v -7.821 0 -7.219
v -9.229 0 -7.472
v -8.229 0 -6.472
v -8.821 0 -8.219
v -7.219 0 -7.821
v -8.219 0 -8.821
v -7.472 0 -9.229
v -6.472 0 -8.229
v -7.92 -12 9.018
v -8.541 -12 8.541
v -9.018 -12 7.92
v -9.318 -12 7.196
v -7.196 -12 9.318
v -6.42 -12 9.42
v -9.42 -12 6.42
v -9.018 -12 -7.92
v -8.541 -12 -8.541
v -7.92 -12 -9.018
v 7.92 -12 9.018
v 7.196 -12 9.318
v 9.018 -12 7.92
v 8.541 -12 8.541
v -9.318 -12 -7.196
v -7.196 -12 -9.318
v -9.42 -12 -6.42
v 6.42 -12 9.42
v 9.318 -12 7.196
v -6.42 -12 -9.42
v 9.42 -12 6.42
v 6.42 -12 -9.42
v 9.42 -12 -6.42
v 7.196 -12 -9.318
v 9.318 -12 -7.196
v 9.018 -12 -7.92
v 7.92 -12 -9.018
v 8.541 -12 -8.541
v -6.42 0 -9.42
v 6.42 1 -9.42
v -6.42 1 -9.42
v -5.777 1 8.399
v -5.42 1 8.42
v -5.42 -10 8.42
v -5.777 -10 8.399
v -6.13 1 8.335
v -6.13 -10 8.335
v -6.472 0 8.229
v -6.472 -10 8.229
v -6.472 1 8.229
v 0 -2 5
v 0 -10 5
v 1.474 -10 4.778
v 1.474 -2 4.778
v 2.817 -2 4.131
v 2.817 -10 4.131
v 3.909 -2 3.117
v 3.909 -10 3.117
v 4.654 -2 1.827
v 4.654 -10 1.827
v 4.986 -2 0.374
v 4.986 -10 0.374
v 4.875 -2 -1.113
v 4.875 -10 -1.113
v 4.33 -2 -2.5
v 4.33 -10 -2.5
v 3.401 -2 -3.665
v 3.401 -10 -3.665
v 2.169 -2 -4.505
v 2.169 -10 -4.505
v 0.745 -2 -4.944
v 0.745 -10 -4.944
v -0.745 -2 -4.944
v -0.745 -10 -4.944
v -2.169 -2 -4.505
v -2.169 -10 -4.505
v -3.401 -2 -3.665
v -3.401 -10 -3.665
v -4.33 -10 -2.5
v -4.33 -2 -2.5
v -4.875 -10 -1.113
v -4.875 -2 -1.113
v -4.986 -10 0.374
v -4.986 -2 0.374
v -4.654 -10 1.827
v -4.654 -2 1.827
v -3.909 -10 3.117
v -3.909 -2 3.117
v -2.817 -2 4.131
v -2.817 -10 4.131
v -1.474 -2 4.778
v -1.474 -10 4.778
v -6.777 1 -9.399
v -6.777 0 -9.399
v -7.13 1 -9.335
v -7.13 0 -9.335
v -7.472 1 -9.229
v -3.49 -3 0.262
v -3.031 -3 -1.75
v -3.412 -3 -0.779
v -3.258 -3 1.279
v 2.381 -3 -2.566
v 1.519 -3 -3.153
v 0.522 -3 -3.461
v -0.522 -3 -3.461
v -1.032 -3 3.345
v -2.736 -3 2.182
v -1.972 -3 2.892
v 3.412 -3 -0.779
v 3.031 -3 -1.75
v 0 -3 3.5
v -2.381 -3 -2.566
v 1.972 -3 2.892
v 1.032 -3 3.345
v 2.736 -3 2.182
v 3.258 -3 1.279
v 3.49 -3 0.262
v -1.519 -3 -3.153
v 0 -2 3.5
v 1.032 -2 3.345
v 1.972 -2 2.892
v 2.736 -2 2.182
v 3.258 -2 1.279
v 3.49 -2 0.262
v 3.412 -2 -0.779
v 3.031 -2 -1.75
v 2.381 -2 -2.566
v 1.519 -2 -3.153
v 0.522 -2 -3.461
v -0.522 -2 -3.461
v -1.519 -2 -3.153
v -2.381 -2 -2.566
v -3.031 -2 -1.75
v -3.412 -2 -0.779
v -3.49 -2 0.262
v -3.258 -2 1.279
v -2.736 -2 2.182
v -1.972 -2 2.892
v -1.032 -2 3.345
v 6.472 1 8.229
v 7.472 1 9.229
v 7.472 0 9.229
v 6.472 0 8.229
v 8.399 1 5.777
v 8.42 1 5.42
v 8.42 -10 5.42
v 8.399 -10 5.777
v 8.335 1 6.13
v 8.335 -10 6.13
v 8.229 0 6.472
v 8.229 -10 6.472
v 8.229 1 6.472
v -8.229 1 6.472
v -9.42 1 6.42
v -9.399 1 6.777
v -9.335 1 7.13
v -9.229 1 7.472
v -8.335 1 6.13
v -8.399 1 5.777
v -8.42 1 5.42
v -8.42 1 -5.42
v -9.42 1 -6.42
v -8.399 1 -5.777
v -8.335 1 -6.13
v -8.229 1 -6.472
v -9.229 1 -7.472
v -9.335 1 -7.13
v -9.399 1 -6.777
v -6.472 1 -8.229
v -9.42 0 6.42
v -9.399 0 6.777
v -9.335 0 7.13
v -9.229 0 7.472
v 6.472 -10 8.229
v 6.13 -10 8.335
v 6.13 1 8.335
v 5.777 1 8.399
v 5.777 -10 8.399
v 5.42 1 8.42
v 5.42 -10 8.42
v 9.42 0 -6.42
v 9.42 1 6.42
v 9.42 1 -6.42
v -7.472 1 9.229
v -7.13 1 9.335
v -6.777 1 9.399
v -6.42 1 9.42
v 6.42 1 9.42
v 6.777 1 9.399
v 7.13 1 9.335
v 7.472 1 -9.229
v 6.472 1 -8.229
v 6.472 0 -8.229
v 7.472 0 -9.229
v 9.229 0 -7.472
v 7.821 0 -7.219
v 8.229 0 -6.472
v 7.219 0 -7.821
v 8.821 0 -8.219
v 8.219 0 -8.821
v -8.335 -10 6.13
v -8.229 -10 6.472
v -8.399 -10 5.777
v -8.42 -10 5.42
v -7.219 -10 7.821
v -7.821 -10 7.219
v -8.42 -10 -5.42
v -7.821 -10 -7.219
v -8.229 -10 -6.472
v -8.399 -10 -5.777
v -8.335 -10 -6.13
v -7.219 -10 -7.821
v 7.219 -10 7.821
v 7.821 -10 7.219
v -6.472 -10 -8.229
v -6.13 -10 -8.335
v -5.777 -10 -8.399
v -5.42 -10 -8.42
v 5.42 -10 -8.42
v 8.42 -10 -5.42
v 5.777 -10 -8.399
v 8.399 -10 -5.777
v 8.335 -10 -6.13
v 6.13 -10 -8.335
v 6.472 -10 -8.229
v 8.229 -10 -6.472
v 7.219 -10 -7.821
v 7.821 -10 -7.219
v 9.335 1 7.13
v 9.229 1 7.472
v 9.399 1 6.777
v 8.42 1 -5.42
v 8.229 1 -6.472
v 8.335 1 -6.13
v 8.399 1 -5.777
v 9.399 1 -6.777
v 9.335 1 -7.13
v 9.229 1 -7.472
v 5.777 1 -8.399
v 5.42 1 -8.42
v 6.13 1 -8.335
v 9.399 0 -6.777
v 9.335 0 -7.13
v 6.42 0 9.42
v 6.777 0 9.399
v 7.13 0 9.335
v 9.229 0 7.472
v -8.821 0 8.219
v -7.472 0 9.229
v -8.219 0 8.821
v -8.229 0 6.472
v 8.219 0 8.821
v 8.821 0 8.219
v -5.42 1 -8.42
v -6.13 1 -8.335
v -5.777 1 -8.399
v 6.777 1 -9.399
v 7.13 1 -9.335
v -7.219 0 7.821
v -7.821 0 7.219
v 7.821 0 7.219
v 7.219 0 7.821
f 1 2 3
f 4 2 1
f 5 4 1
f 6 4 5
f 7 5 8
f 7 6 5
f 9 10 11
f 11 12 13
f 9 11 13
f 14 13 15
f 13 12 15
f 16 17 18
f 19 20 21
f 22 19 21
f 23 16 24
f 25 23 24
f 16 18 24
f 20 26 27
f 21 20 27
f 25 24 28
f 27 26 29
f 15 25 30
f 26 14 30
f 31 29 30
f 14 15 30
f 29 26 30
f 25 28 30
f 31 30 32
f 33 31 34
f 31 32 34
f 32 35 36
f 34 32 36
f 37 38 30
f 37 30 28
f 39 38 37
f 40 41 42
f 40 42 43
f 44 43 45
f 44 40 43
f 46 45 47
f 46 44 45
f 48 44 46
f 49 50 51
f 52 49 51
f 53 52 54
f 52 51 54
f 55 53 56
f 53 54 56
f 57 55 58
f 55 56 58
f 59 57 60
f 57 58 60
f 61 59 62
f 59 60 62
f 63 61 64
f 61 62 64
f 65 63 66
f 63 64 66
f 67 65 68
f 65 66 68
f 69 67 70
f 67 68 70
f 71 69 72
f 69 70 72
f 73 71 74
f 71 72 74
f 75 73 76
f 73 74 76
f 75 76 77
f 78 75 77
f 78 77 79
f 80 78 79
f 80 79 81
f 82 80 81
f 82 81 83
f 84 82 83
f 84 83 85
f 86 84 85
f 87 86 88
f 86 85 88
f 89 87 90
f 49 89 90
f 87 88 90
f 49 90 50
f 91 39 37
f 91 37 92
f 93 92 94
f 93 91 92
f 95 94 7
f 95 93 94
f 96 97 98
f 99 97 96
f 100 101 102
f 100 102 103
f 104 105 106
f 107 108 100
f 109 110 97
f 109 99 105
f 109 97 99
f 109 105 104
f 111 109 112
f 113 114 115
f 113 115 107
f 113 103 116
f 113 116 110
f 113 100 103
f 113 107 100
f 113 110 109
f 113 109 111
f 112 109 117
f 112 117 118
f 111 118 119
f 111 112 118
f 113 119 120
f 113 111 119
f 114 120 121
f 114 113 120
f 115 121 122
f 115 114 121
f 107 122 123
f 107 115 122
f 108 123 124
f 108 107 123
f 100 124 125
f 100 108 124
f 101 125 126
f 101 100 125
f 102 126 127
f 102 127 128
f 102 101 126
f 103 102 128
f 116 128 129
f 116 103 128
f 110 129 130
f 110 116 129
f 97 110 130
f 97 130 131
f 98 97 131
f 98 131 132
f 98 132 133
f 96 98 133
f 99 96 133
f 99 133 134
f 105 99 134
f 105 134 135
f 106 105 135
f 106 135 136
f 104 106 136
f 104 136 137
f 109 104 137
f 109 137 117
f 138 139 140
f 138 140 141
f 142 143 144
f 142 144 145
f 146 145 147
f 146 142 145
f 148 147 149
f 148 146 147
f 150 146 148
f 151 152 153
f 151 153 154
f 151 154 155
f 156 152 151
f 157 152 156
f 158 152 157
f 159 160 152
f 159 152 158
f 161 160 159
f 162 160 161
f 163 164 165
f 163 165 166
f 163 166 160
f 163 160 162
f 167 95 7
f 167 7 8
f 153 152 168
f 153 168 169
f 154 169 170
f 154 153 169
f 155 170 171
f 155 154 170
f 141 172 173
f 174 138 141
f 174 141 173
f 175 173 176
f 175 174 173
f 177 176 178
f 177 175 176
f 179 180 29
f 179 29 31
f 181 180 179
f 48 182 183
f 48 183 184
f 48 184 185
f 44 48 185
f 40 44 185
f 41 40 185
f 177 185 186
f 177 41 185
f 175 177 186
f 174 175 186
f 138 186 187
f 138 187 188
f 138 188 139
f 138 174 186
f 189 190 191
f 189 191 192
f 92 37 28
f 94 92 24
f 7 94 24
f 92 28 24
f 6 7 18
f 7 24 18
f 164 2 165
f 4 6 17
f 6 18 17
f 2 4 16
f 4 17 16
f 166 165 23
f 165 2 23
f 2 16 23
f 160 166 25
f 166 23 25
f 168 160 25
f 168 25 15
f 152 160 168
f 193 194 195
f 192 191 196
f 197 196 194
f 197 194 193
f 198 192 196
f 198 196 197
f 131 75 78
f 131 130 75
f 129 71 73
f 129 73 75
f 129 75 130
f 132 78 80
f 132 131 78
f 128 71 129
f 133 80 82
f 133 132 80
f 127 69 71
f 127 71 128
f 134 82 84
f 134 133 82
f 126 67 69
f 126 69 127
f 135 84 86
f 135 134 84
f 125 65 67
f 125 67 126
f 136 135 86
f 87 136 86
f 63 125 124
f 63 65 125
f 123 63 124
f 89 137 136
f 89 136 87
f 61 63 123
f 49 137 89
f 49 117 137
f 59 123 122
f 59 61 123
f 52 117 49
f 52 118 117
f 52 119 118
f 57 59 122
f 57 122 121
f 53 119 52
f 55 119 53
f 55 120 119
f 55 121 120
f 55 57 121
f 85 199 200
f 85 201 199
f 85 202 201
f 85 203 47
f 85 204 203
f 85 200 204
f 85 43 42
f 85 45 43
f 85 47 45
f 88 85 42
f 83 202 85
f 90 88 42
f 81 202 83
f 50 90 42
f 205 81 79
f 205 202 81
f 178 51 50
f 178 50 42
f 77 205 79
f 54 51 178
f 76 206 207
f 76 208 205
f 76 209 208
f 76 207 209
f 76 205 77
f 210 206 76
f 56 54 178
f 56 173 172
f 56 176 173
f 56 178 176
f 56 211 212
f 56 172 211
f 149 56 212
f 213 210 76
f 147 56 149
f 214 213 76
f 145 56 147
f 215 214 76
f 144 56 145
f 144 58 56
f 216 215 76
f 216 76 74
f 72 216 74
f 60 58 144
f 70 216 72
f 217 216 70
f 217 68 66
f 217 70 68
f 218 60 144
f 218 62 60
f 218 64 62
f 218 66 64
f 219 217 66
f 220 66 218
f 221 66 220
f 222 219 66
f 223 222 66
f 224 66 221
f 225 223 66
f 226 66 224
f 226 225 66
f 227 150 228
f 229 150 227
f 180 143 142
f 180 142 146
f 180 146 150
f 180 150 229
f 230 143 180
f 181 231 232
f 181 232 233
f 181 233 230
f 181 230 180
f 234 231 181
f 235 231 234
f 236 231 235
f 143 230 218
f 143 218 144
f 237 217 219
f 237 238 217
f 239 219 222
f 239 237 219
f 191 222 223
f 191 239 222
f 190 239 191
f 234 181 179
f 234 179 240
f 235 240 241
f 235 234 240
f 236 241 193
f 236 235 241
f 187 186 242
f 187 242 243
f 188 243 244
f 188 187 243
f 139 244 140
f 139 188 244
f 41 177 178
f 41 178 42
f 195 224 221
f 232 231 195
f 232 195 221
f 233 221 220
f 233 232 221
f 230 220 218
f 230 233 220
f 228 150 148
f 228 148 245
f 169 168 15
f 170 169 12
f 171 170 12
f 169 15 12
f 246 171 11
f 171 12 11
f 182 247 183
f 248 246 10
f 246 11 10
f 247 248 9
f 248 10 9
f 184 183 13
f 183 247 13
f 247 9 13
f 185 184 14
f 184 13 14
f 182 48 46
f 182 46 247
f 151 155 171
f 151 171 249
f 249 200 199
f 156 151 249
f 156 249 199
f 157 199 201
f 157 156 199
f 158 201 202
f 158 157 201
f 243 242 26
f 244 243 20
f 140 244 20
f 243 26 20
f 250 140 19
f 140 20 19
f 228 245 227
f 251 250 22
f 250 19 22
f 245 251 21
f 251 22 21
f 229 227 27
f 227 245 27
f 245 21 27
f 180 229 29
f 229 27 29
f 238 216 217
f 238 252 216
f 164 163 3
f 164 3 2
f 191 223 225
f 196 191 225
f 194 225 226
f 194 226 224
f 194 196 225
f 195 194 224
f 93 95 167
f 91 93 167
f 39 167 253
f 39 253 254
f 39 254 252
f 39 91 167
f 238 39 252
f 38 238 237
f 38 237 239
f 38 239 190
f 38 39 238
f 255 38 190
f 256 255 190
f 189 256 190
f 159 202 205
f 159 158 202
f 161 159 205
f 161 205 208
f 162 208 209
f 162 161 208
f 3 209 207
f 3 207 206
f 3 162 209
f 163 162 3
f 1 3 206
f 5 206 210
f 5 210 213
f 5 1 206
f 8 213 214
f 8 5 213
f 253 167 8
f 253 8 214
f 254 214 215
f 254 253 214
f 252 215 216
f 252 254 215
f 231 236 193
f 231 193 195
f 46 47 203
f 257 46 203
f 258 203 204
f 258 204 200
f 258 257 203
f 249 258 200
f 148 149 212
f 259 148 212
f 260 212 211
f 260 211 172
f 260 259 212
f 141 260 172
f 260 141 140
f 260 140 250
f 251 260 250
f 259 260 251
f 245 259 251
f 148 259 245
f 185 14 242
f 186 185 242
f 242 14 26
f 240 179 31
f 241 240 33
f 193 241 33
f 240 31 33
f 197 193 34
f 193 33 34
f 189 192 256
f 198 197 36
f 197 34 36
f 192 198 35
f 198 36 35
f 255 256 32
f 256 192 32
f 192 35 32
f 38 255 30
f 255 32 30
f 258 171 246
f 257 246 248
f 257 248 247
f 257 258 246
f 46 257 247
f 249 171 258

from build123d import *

# Parameters (mm, degrees)
EXTRUDE_3_DEPTH = 10
EXTRUDE_START   = -12
EXTRUDE_4_DEPTH = 2
EXTRUDE_START_2 = 1
EXTRUDE_5_DEPTH = 1
SKETCH_2_R      = 5
SKETCH_2_R_2    = 3.5
EXTRUDE_6_DEPTH = 8
SKETCH_2_2_R    = 3.5
EXTRUDE_7_DEPTH = 7


# Read off the part's stored shape, not the designer's step: 凸台-拉伸4
with BuildPart() as part:
    # 草图1 → 凸台-拉伸3 (new body)
    with BuildSketch(Plane(origin=(0, 0, 0), x_dir=(1, 0, 0), z_dir=(0, 1, 0))):
        with BuildLine():
            Line((-8.229462415, 6.472103102), (-9.229462415, 7.472103102))
            ThreePointArc((-9.229462415, 7.472103102), (-9.371981305, 6.954608621), (-9.42, 6.42))
            Line((-9.42, 6.42), (-9.42, -6.42))
            ThreePointArc((-9.42, -6.42), (-9.371981305, -6.954608621), (-9.229462415, -7.472103102))
            Line((-9.229462415, -7.472103102), (-8.229462415, -6.472103102))
            ThreePointArc((-8.229462415, -6.472103102), (-8.371981305, -5.954608621), (-8.42, -5.42))
            Line((-8.42, -5.42), (-8.42, 5.42))
            ThreePointArc((-8.42, 5.42), (-8.371981305, 5.954608621), (-8.229462415, 6.472103102))
        make_face()
        with BuildLine():
            Line((-6.472103102, 8.229462415), (-7.472103102, 9.229462415))
            ThreePointArc((-7.472103102, 9.229462415), (-8.541320344, 8.541320344), (-9.229462415, 7.472103102))
            Line((-9.229462415, 7.472103102), (-8.229462415, 6.472103102))
            ThreePointArc((-8.229462415, 6.472103102), (-7.541320344, 7.541320344), (-6.472103102, 8.229462415))
        make_face()
        with BuildLine():
            ThreePointArc((7.472103102, 9.229462415), (6.954608621, 9.371981305), (6.42, 9.42))
            Line((6.42, 9.42), (-6.42, 9.42))
            ThreePointArc((-6.42, 9.42), (-6.954608621, 9.371981305), (-7.472103102, 9.229462415))
            Line((-7.472103102, 9.229462415), (-6.472103102, 8.229462415))
            ThreePointArc((-6.472103102, 8.229462415), (-5.954608621, 8.371981305), (-5.42, 8.42))
            Line((-5.42, 8.42), (5.42, 8.42))
            ThreePointArc((5.42, 8.42), (5.954608621, 8.371981305), (6.472103102, 8.229462415))
            Line((6.472103102, 8.229462415), (7.472103102, 9.229462415))
        make_face()
        with BuildLine():
            Line((-8.229462415, -6.472103102), (-9.229462415, -7.472103102))
            ThreePointArc((-9.229462415, -7.472103102), (-8.541320344, -8.541320344), (-7.472103102, -9.229462415))
            Line((-7.472103102, -9.229462415), (-6.472103102, -8.229462415))
            ThreePointArc((-6.472103102, -8.229462415), (-7.541320344, -7.541320344), (-8.229462415, -6.472103102))
        make_face()
        with BuildLine():
            ThreePointArc((6.42, -9.42), (6.954608621, -9.371981305), (7.472103102, -9.229462415))
            Line((7.472103102, -9.229462415), (6.472103102, -8.229462415))
            ThreePointArc((6.472103102, -8.229462415), (5.954608621, -8.371981305), (5.42, -8.42))
            Line((5.42, -8.42), (-5.42, -8.42))
            ThreePointArc((-5.42, -8.42), (-5.954608621, -8.371981305), (-6.472103102, -8.229462415))
            Line((-6.472103102, -8.229462415), (-7.472103102, -9.229462415))
            ThreePointArc((-7.472103102, -9.229462415), (-6.954608621, -9.371981305), (-6.42, -9.42))
            Line((-6.42, -9.42), (6.42, -9.42))
        make_face()
        with BuildLine():
            ThreePointArc((7.472103102, -9.229462415), (8.541320344, -8.541320344), (9.229462415, -7.472103102))
            Line((9.229462415, -7.472103102), (8.229462415, -6.472103102))
            ThreePointArc((8.229462415, -6.472103102), (7.541320344, -7.541320344), (6.472103102, -8.229462415))
            Line((6.472103102, -8.229462415), (7.472103102, -9.229462415))
        make_face()
        with BuildLine():
            ThreePointArc((9.42, 6.42), (9.371981305, 6.954608621), (9.229462415, 7.472103102))
            Line((9.229462415, 7.472103102), (8.229462415, 6.472103102))
            ThreePointArc((8.229462415, 6.472103102), (8.371981305, 5.954608621), (8.42, 5.42))
            Line((8.42, 5.42), (8.42, -5.42))
            ThreePointArc((8.42, -5.42), (8.371981305, -5.954608621), (8.229462415, -6.472103102))
            Line((8.229462415, -6.472103102), (9.229462415, -7.472103102))
            ThreePointArc((9.229462415, -7.472103102), (9.371981305, -6.954608621), (9.42, -6.42))
            Line((9.42, -6.42), (9.42, 6.42))
        make_face()
        with BuildLine():
            ThreePointArc((9.229462415, 7.472103102), (8.541320344, 8.541320344), (7.472103102, 9.229462415))
            Line((7.472103102, 9.229462415), (6.472103102, 8.229462415))
            ThreePointArc((6.472103102, 8.229462415), (7.541320344, 7.541320344), (8.229462415, 6.472103102))
            Line((8.229462415, 6.472103102), (9.229462415, 7.472103102))
        make_face()
    extrude(amount=-EXTRUDE_3_DEPTH)

    # 凸台-拉伸4 outline → 凸台-拉伸4 (add)
    with BuildSketch(Plane(origin=(0, 0, 0), x_dir=(1, 0, 0), z_dir=(0, 1, 0)).offset(EXTRUDE_START)):
        with BuildLine():
            Line((-9.42, 6.42), (-9.42, -6.42))
            ThreePointArc((-9.42, -6.42), (-8.541320344, -8.541320344), (-6.42, -9.42))
            Line((-6.42, -9.42), (6.42, -9.42))
            ThreePointArc((6.42, -9.42), (8.541320344, -8.541320344), (9.42, -6.42))
            Line((9.42, -6.42), (9.42, 6.42))
            ThreePointArc((9.42, 6.42), (8.541320344, 8.541320344), (6.42, 9.42))
            Line((6.42, 9.42), (-6.42, 9.42))
            ThreePointArc((-6.42, 9.42), (-8.541320344, 8.541320344), (-9.42, 6.42))
        make_face()
    extrude(amount=EXTRUDE_4_DEPTH)

    # 草图1<7> → 凸台-拉伸5 (add)
    with BuildSketch(Plane(origin=(0, 0, 0), x_dir=(1, 0, 0), z_dir=(0, 1, 0)).offset(EXTRUDE_START_2)):
        with BuildLine():
            Line((-8.229462415, 6.472103102), (-9.229462415, 7.472103102))
            ThreePointArc((-9.229462415, 7.472103102), (-9.371981305, 6.954608621), (-9.42, 6.42))
            Line((-9.42, 6.42), (-9.42, -6.42))
            ThreePointArc((-9.42, -6.42), (-9.371981305, -6.954608621), (-9.229462415, -7.472103102))
            Line((-9.229462415, -7.472103102), (-8.229462415, -6.472103102))
            ThreePointArc((-8.229462415, -6.472103102), (-8.371981305, -5.954608621), (-8.42, -5.42))
            Line((-8.42, -5.42), (-8.42, 5.42))
            ThreePointArc((-8.42, 5.42), (-8.371981305, 5.954608621), (-8.229462415, 6.472103102))
        make_face()
        with BuildLine():
            ThreePointArc((7.472103102, 9.229462415), (6.954608621, 9.371981305), (6.42, 9.42))
            Line((6.42, 9.42), (-6.42, 9.42))
            ThreePointArc((-6.42, 9.42), (-6.954608621, 9.371981305), (-7.472103102, 9.229462415))
            Line((-7.472103102, 9.229462415), (-6.472103102, 8.229462415))
            ThreePointArc((-6.472103102, 8.229462415), (-5.954608621, 8.371981305), (-5.42, 8.42))
            Line((-5.42, 8.42), (5.42, 8.42))
            ThreePointArc((5.42, 8.42), (5.954608621, 8.371981305), (6.472103102, 8.229462415))
            Line((6.472103102, 8.229462415), (7.472103102, 9.229462415))
        make_face()
        with BuildLine():
            ThreePointArc((9.42, 6.42), (9.371981305, 6.954608621), (9.229462415, 7.472103102))
            Line((9.229462415, 7.472103102), (8.229462415, 6.472103102))
            ThreePointArc((8.229462415, 6.472103102), (8.371981305, 5.954608621), (8.42, 5.42))
            Line((8.42, 5.42), (8.42, -5.42))
            ThreePointArc((8.42, -5.42), (8.371981305, -5.954608621), (8.229462415, -6.472103102))
            Line((8.229462415, -6.472103102), (9.229462415, -7.472103102))
            ThreePointArc((9.229462415, -7.472103102), (9.371981305, -6.954608621), (9.42, -6.42))
            Line((9.42, -6.42), (9.42, 6.42))
        make_face()
        with BuildLine():
            ThreePointArc((6.42, -9.42), (6.954608621, -9.371981305), (7.472103102, -9.229462415))
            Line((7.472103102, -9.229462415), (6.472103102, -8.229462415))
            ThreePointArc((6.472103102, -8.229462415), (5.954608621, -8.371981305), (5.42, -8.42))
            Line((5.42, -8.42), (-5.42, -8.42))
            ThreePointArc((-5.42, -8.42), (-5.954608621, -8.371981305), (-6.472103102, -8.229462415))
            Line((-6.472103102, -8.229462415), (-7.472103102, -9.229462415))
            ThreePointArc((-7.472103102, -9.229462415), (-6.954608621, -9.371981305), (-6.42, -9.42))
            Line((-6.42, -9.42), (6.42, -9.42))
        make_face()
    extrude(amount=-EXTRUDE_5_DEPTH)

    # 草图2 → 凸台-拉伸6 (add)
    with BuildSketch(Plane(origin=(0, -10, 0), x_dir=(1, 0, 0), z_dir=(0, 1, 0))):
        with Locations(Location((0, 0, 0), (0, 0, 270))):
            Circle(SKETCH_2_R)
        with Locations(Location((0, 0, 0), (0, 0, 270))):
            Circle(SKETCH_2_R_2, mode=Mode.SUBTRACT)
    extrude(amount=EXTRUDE_6_DEPTH)

    # 草图2<2> → 凸台-拉伸7 (add)
    with BuildSketch(Plane(origin=(0, -10, 0), x_dir=(1, 0, 0), z_dir=(0, 1, 0))):
        with Locations(Location((0, 0, 0), (0, 0, 270))):
            Circle(SKETCH_2_2_R)
    extrude(amount=EXTRUDE_7_DEPTH)


solid = part.part
